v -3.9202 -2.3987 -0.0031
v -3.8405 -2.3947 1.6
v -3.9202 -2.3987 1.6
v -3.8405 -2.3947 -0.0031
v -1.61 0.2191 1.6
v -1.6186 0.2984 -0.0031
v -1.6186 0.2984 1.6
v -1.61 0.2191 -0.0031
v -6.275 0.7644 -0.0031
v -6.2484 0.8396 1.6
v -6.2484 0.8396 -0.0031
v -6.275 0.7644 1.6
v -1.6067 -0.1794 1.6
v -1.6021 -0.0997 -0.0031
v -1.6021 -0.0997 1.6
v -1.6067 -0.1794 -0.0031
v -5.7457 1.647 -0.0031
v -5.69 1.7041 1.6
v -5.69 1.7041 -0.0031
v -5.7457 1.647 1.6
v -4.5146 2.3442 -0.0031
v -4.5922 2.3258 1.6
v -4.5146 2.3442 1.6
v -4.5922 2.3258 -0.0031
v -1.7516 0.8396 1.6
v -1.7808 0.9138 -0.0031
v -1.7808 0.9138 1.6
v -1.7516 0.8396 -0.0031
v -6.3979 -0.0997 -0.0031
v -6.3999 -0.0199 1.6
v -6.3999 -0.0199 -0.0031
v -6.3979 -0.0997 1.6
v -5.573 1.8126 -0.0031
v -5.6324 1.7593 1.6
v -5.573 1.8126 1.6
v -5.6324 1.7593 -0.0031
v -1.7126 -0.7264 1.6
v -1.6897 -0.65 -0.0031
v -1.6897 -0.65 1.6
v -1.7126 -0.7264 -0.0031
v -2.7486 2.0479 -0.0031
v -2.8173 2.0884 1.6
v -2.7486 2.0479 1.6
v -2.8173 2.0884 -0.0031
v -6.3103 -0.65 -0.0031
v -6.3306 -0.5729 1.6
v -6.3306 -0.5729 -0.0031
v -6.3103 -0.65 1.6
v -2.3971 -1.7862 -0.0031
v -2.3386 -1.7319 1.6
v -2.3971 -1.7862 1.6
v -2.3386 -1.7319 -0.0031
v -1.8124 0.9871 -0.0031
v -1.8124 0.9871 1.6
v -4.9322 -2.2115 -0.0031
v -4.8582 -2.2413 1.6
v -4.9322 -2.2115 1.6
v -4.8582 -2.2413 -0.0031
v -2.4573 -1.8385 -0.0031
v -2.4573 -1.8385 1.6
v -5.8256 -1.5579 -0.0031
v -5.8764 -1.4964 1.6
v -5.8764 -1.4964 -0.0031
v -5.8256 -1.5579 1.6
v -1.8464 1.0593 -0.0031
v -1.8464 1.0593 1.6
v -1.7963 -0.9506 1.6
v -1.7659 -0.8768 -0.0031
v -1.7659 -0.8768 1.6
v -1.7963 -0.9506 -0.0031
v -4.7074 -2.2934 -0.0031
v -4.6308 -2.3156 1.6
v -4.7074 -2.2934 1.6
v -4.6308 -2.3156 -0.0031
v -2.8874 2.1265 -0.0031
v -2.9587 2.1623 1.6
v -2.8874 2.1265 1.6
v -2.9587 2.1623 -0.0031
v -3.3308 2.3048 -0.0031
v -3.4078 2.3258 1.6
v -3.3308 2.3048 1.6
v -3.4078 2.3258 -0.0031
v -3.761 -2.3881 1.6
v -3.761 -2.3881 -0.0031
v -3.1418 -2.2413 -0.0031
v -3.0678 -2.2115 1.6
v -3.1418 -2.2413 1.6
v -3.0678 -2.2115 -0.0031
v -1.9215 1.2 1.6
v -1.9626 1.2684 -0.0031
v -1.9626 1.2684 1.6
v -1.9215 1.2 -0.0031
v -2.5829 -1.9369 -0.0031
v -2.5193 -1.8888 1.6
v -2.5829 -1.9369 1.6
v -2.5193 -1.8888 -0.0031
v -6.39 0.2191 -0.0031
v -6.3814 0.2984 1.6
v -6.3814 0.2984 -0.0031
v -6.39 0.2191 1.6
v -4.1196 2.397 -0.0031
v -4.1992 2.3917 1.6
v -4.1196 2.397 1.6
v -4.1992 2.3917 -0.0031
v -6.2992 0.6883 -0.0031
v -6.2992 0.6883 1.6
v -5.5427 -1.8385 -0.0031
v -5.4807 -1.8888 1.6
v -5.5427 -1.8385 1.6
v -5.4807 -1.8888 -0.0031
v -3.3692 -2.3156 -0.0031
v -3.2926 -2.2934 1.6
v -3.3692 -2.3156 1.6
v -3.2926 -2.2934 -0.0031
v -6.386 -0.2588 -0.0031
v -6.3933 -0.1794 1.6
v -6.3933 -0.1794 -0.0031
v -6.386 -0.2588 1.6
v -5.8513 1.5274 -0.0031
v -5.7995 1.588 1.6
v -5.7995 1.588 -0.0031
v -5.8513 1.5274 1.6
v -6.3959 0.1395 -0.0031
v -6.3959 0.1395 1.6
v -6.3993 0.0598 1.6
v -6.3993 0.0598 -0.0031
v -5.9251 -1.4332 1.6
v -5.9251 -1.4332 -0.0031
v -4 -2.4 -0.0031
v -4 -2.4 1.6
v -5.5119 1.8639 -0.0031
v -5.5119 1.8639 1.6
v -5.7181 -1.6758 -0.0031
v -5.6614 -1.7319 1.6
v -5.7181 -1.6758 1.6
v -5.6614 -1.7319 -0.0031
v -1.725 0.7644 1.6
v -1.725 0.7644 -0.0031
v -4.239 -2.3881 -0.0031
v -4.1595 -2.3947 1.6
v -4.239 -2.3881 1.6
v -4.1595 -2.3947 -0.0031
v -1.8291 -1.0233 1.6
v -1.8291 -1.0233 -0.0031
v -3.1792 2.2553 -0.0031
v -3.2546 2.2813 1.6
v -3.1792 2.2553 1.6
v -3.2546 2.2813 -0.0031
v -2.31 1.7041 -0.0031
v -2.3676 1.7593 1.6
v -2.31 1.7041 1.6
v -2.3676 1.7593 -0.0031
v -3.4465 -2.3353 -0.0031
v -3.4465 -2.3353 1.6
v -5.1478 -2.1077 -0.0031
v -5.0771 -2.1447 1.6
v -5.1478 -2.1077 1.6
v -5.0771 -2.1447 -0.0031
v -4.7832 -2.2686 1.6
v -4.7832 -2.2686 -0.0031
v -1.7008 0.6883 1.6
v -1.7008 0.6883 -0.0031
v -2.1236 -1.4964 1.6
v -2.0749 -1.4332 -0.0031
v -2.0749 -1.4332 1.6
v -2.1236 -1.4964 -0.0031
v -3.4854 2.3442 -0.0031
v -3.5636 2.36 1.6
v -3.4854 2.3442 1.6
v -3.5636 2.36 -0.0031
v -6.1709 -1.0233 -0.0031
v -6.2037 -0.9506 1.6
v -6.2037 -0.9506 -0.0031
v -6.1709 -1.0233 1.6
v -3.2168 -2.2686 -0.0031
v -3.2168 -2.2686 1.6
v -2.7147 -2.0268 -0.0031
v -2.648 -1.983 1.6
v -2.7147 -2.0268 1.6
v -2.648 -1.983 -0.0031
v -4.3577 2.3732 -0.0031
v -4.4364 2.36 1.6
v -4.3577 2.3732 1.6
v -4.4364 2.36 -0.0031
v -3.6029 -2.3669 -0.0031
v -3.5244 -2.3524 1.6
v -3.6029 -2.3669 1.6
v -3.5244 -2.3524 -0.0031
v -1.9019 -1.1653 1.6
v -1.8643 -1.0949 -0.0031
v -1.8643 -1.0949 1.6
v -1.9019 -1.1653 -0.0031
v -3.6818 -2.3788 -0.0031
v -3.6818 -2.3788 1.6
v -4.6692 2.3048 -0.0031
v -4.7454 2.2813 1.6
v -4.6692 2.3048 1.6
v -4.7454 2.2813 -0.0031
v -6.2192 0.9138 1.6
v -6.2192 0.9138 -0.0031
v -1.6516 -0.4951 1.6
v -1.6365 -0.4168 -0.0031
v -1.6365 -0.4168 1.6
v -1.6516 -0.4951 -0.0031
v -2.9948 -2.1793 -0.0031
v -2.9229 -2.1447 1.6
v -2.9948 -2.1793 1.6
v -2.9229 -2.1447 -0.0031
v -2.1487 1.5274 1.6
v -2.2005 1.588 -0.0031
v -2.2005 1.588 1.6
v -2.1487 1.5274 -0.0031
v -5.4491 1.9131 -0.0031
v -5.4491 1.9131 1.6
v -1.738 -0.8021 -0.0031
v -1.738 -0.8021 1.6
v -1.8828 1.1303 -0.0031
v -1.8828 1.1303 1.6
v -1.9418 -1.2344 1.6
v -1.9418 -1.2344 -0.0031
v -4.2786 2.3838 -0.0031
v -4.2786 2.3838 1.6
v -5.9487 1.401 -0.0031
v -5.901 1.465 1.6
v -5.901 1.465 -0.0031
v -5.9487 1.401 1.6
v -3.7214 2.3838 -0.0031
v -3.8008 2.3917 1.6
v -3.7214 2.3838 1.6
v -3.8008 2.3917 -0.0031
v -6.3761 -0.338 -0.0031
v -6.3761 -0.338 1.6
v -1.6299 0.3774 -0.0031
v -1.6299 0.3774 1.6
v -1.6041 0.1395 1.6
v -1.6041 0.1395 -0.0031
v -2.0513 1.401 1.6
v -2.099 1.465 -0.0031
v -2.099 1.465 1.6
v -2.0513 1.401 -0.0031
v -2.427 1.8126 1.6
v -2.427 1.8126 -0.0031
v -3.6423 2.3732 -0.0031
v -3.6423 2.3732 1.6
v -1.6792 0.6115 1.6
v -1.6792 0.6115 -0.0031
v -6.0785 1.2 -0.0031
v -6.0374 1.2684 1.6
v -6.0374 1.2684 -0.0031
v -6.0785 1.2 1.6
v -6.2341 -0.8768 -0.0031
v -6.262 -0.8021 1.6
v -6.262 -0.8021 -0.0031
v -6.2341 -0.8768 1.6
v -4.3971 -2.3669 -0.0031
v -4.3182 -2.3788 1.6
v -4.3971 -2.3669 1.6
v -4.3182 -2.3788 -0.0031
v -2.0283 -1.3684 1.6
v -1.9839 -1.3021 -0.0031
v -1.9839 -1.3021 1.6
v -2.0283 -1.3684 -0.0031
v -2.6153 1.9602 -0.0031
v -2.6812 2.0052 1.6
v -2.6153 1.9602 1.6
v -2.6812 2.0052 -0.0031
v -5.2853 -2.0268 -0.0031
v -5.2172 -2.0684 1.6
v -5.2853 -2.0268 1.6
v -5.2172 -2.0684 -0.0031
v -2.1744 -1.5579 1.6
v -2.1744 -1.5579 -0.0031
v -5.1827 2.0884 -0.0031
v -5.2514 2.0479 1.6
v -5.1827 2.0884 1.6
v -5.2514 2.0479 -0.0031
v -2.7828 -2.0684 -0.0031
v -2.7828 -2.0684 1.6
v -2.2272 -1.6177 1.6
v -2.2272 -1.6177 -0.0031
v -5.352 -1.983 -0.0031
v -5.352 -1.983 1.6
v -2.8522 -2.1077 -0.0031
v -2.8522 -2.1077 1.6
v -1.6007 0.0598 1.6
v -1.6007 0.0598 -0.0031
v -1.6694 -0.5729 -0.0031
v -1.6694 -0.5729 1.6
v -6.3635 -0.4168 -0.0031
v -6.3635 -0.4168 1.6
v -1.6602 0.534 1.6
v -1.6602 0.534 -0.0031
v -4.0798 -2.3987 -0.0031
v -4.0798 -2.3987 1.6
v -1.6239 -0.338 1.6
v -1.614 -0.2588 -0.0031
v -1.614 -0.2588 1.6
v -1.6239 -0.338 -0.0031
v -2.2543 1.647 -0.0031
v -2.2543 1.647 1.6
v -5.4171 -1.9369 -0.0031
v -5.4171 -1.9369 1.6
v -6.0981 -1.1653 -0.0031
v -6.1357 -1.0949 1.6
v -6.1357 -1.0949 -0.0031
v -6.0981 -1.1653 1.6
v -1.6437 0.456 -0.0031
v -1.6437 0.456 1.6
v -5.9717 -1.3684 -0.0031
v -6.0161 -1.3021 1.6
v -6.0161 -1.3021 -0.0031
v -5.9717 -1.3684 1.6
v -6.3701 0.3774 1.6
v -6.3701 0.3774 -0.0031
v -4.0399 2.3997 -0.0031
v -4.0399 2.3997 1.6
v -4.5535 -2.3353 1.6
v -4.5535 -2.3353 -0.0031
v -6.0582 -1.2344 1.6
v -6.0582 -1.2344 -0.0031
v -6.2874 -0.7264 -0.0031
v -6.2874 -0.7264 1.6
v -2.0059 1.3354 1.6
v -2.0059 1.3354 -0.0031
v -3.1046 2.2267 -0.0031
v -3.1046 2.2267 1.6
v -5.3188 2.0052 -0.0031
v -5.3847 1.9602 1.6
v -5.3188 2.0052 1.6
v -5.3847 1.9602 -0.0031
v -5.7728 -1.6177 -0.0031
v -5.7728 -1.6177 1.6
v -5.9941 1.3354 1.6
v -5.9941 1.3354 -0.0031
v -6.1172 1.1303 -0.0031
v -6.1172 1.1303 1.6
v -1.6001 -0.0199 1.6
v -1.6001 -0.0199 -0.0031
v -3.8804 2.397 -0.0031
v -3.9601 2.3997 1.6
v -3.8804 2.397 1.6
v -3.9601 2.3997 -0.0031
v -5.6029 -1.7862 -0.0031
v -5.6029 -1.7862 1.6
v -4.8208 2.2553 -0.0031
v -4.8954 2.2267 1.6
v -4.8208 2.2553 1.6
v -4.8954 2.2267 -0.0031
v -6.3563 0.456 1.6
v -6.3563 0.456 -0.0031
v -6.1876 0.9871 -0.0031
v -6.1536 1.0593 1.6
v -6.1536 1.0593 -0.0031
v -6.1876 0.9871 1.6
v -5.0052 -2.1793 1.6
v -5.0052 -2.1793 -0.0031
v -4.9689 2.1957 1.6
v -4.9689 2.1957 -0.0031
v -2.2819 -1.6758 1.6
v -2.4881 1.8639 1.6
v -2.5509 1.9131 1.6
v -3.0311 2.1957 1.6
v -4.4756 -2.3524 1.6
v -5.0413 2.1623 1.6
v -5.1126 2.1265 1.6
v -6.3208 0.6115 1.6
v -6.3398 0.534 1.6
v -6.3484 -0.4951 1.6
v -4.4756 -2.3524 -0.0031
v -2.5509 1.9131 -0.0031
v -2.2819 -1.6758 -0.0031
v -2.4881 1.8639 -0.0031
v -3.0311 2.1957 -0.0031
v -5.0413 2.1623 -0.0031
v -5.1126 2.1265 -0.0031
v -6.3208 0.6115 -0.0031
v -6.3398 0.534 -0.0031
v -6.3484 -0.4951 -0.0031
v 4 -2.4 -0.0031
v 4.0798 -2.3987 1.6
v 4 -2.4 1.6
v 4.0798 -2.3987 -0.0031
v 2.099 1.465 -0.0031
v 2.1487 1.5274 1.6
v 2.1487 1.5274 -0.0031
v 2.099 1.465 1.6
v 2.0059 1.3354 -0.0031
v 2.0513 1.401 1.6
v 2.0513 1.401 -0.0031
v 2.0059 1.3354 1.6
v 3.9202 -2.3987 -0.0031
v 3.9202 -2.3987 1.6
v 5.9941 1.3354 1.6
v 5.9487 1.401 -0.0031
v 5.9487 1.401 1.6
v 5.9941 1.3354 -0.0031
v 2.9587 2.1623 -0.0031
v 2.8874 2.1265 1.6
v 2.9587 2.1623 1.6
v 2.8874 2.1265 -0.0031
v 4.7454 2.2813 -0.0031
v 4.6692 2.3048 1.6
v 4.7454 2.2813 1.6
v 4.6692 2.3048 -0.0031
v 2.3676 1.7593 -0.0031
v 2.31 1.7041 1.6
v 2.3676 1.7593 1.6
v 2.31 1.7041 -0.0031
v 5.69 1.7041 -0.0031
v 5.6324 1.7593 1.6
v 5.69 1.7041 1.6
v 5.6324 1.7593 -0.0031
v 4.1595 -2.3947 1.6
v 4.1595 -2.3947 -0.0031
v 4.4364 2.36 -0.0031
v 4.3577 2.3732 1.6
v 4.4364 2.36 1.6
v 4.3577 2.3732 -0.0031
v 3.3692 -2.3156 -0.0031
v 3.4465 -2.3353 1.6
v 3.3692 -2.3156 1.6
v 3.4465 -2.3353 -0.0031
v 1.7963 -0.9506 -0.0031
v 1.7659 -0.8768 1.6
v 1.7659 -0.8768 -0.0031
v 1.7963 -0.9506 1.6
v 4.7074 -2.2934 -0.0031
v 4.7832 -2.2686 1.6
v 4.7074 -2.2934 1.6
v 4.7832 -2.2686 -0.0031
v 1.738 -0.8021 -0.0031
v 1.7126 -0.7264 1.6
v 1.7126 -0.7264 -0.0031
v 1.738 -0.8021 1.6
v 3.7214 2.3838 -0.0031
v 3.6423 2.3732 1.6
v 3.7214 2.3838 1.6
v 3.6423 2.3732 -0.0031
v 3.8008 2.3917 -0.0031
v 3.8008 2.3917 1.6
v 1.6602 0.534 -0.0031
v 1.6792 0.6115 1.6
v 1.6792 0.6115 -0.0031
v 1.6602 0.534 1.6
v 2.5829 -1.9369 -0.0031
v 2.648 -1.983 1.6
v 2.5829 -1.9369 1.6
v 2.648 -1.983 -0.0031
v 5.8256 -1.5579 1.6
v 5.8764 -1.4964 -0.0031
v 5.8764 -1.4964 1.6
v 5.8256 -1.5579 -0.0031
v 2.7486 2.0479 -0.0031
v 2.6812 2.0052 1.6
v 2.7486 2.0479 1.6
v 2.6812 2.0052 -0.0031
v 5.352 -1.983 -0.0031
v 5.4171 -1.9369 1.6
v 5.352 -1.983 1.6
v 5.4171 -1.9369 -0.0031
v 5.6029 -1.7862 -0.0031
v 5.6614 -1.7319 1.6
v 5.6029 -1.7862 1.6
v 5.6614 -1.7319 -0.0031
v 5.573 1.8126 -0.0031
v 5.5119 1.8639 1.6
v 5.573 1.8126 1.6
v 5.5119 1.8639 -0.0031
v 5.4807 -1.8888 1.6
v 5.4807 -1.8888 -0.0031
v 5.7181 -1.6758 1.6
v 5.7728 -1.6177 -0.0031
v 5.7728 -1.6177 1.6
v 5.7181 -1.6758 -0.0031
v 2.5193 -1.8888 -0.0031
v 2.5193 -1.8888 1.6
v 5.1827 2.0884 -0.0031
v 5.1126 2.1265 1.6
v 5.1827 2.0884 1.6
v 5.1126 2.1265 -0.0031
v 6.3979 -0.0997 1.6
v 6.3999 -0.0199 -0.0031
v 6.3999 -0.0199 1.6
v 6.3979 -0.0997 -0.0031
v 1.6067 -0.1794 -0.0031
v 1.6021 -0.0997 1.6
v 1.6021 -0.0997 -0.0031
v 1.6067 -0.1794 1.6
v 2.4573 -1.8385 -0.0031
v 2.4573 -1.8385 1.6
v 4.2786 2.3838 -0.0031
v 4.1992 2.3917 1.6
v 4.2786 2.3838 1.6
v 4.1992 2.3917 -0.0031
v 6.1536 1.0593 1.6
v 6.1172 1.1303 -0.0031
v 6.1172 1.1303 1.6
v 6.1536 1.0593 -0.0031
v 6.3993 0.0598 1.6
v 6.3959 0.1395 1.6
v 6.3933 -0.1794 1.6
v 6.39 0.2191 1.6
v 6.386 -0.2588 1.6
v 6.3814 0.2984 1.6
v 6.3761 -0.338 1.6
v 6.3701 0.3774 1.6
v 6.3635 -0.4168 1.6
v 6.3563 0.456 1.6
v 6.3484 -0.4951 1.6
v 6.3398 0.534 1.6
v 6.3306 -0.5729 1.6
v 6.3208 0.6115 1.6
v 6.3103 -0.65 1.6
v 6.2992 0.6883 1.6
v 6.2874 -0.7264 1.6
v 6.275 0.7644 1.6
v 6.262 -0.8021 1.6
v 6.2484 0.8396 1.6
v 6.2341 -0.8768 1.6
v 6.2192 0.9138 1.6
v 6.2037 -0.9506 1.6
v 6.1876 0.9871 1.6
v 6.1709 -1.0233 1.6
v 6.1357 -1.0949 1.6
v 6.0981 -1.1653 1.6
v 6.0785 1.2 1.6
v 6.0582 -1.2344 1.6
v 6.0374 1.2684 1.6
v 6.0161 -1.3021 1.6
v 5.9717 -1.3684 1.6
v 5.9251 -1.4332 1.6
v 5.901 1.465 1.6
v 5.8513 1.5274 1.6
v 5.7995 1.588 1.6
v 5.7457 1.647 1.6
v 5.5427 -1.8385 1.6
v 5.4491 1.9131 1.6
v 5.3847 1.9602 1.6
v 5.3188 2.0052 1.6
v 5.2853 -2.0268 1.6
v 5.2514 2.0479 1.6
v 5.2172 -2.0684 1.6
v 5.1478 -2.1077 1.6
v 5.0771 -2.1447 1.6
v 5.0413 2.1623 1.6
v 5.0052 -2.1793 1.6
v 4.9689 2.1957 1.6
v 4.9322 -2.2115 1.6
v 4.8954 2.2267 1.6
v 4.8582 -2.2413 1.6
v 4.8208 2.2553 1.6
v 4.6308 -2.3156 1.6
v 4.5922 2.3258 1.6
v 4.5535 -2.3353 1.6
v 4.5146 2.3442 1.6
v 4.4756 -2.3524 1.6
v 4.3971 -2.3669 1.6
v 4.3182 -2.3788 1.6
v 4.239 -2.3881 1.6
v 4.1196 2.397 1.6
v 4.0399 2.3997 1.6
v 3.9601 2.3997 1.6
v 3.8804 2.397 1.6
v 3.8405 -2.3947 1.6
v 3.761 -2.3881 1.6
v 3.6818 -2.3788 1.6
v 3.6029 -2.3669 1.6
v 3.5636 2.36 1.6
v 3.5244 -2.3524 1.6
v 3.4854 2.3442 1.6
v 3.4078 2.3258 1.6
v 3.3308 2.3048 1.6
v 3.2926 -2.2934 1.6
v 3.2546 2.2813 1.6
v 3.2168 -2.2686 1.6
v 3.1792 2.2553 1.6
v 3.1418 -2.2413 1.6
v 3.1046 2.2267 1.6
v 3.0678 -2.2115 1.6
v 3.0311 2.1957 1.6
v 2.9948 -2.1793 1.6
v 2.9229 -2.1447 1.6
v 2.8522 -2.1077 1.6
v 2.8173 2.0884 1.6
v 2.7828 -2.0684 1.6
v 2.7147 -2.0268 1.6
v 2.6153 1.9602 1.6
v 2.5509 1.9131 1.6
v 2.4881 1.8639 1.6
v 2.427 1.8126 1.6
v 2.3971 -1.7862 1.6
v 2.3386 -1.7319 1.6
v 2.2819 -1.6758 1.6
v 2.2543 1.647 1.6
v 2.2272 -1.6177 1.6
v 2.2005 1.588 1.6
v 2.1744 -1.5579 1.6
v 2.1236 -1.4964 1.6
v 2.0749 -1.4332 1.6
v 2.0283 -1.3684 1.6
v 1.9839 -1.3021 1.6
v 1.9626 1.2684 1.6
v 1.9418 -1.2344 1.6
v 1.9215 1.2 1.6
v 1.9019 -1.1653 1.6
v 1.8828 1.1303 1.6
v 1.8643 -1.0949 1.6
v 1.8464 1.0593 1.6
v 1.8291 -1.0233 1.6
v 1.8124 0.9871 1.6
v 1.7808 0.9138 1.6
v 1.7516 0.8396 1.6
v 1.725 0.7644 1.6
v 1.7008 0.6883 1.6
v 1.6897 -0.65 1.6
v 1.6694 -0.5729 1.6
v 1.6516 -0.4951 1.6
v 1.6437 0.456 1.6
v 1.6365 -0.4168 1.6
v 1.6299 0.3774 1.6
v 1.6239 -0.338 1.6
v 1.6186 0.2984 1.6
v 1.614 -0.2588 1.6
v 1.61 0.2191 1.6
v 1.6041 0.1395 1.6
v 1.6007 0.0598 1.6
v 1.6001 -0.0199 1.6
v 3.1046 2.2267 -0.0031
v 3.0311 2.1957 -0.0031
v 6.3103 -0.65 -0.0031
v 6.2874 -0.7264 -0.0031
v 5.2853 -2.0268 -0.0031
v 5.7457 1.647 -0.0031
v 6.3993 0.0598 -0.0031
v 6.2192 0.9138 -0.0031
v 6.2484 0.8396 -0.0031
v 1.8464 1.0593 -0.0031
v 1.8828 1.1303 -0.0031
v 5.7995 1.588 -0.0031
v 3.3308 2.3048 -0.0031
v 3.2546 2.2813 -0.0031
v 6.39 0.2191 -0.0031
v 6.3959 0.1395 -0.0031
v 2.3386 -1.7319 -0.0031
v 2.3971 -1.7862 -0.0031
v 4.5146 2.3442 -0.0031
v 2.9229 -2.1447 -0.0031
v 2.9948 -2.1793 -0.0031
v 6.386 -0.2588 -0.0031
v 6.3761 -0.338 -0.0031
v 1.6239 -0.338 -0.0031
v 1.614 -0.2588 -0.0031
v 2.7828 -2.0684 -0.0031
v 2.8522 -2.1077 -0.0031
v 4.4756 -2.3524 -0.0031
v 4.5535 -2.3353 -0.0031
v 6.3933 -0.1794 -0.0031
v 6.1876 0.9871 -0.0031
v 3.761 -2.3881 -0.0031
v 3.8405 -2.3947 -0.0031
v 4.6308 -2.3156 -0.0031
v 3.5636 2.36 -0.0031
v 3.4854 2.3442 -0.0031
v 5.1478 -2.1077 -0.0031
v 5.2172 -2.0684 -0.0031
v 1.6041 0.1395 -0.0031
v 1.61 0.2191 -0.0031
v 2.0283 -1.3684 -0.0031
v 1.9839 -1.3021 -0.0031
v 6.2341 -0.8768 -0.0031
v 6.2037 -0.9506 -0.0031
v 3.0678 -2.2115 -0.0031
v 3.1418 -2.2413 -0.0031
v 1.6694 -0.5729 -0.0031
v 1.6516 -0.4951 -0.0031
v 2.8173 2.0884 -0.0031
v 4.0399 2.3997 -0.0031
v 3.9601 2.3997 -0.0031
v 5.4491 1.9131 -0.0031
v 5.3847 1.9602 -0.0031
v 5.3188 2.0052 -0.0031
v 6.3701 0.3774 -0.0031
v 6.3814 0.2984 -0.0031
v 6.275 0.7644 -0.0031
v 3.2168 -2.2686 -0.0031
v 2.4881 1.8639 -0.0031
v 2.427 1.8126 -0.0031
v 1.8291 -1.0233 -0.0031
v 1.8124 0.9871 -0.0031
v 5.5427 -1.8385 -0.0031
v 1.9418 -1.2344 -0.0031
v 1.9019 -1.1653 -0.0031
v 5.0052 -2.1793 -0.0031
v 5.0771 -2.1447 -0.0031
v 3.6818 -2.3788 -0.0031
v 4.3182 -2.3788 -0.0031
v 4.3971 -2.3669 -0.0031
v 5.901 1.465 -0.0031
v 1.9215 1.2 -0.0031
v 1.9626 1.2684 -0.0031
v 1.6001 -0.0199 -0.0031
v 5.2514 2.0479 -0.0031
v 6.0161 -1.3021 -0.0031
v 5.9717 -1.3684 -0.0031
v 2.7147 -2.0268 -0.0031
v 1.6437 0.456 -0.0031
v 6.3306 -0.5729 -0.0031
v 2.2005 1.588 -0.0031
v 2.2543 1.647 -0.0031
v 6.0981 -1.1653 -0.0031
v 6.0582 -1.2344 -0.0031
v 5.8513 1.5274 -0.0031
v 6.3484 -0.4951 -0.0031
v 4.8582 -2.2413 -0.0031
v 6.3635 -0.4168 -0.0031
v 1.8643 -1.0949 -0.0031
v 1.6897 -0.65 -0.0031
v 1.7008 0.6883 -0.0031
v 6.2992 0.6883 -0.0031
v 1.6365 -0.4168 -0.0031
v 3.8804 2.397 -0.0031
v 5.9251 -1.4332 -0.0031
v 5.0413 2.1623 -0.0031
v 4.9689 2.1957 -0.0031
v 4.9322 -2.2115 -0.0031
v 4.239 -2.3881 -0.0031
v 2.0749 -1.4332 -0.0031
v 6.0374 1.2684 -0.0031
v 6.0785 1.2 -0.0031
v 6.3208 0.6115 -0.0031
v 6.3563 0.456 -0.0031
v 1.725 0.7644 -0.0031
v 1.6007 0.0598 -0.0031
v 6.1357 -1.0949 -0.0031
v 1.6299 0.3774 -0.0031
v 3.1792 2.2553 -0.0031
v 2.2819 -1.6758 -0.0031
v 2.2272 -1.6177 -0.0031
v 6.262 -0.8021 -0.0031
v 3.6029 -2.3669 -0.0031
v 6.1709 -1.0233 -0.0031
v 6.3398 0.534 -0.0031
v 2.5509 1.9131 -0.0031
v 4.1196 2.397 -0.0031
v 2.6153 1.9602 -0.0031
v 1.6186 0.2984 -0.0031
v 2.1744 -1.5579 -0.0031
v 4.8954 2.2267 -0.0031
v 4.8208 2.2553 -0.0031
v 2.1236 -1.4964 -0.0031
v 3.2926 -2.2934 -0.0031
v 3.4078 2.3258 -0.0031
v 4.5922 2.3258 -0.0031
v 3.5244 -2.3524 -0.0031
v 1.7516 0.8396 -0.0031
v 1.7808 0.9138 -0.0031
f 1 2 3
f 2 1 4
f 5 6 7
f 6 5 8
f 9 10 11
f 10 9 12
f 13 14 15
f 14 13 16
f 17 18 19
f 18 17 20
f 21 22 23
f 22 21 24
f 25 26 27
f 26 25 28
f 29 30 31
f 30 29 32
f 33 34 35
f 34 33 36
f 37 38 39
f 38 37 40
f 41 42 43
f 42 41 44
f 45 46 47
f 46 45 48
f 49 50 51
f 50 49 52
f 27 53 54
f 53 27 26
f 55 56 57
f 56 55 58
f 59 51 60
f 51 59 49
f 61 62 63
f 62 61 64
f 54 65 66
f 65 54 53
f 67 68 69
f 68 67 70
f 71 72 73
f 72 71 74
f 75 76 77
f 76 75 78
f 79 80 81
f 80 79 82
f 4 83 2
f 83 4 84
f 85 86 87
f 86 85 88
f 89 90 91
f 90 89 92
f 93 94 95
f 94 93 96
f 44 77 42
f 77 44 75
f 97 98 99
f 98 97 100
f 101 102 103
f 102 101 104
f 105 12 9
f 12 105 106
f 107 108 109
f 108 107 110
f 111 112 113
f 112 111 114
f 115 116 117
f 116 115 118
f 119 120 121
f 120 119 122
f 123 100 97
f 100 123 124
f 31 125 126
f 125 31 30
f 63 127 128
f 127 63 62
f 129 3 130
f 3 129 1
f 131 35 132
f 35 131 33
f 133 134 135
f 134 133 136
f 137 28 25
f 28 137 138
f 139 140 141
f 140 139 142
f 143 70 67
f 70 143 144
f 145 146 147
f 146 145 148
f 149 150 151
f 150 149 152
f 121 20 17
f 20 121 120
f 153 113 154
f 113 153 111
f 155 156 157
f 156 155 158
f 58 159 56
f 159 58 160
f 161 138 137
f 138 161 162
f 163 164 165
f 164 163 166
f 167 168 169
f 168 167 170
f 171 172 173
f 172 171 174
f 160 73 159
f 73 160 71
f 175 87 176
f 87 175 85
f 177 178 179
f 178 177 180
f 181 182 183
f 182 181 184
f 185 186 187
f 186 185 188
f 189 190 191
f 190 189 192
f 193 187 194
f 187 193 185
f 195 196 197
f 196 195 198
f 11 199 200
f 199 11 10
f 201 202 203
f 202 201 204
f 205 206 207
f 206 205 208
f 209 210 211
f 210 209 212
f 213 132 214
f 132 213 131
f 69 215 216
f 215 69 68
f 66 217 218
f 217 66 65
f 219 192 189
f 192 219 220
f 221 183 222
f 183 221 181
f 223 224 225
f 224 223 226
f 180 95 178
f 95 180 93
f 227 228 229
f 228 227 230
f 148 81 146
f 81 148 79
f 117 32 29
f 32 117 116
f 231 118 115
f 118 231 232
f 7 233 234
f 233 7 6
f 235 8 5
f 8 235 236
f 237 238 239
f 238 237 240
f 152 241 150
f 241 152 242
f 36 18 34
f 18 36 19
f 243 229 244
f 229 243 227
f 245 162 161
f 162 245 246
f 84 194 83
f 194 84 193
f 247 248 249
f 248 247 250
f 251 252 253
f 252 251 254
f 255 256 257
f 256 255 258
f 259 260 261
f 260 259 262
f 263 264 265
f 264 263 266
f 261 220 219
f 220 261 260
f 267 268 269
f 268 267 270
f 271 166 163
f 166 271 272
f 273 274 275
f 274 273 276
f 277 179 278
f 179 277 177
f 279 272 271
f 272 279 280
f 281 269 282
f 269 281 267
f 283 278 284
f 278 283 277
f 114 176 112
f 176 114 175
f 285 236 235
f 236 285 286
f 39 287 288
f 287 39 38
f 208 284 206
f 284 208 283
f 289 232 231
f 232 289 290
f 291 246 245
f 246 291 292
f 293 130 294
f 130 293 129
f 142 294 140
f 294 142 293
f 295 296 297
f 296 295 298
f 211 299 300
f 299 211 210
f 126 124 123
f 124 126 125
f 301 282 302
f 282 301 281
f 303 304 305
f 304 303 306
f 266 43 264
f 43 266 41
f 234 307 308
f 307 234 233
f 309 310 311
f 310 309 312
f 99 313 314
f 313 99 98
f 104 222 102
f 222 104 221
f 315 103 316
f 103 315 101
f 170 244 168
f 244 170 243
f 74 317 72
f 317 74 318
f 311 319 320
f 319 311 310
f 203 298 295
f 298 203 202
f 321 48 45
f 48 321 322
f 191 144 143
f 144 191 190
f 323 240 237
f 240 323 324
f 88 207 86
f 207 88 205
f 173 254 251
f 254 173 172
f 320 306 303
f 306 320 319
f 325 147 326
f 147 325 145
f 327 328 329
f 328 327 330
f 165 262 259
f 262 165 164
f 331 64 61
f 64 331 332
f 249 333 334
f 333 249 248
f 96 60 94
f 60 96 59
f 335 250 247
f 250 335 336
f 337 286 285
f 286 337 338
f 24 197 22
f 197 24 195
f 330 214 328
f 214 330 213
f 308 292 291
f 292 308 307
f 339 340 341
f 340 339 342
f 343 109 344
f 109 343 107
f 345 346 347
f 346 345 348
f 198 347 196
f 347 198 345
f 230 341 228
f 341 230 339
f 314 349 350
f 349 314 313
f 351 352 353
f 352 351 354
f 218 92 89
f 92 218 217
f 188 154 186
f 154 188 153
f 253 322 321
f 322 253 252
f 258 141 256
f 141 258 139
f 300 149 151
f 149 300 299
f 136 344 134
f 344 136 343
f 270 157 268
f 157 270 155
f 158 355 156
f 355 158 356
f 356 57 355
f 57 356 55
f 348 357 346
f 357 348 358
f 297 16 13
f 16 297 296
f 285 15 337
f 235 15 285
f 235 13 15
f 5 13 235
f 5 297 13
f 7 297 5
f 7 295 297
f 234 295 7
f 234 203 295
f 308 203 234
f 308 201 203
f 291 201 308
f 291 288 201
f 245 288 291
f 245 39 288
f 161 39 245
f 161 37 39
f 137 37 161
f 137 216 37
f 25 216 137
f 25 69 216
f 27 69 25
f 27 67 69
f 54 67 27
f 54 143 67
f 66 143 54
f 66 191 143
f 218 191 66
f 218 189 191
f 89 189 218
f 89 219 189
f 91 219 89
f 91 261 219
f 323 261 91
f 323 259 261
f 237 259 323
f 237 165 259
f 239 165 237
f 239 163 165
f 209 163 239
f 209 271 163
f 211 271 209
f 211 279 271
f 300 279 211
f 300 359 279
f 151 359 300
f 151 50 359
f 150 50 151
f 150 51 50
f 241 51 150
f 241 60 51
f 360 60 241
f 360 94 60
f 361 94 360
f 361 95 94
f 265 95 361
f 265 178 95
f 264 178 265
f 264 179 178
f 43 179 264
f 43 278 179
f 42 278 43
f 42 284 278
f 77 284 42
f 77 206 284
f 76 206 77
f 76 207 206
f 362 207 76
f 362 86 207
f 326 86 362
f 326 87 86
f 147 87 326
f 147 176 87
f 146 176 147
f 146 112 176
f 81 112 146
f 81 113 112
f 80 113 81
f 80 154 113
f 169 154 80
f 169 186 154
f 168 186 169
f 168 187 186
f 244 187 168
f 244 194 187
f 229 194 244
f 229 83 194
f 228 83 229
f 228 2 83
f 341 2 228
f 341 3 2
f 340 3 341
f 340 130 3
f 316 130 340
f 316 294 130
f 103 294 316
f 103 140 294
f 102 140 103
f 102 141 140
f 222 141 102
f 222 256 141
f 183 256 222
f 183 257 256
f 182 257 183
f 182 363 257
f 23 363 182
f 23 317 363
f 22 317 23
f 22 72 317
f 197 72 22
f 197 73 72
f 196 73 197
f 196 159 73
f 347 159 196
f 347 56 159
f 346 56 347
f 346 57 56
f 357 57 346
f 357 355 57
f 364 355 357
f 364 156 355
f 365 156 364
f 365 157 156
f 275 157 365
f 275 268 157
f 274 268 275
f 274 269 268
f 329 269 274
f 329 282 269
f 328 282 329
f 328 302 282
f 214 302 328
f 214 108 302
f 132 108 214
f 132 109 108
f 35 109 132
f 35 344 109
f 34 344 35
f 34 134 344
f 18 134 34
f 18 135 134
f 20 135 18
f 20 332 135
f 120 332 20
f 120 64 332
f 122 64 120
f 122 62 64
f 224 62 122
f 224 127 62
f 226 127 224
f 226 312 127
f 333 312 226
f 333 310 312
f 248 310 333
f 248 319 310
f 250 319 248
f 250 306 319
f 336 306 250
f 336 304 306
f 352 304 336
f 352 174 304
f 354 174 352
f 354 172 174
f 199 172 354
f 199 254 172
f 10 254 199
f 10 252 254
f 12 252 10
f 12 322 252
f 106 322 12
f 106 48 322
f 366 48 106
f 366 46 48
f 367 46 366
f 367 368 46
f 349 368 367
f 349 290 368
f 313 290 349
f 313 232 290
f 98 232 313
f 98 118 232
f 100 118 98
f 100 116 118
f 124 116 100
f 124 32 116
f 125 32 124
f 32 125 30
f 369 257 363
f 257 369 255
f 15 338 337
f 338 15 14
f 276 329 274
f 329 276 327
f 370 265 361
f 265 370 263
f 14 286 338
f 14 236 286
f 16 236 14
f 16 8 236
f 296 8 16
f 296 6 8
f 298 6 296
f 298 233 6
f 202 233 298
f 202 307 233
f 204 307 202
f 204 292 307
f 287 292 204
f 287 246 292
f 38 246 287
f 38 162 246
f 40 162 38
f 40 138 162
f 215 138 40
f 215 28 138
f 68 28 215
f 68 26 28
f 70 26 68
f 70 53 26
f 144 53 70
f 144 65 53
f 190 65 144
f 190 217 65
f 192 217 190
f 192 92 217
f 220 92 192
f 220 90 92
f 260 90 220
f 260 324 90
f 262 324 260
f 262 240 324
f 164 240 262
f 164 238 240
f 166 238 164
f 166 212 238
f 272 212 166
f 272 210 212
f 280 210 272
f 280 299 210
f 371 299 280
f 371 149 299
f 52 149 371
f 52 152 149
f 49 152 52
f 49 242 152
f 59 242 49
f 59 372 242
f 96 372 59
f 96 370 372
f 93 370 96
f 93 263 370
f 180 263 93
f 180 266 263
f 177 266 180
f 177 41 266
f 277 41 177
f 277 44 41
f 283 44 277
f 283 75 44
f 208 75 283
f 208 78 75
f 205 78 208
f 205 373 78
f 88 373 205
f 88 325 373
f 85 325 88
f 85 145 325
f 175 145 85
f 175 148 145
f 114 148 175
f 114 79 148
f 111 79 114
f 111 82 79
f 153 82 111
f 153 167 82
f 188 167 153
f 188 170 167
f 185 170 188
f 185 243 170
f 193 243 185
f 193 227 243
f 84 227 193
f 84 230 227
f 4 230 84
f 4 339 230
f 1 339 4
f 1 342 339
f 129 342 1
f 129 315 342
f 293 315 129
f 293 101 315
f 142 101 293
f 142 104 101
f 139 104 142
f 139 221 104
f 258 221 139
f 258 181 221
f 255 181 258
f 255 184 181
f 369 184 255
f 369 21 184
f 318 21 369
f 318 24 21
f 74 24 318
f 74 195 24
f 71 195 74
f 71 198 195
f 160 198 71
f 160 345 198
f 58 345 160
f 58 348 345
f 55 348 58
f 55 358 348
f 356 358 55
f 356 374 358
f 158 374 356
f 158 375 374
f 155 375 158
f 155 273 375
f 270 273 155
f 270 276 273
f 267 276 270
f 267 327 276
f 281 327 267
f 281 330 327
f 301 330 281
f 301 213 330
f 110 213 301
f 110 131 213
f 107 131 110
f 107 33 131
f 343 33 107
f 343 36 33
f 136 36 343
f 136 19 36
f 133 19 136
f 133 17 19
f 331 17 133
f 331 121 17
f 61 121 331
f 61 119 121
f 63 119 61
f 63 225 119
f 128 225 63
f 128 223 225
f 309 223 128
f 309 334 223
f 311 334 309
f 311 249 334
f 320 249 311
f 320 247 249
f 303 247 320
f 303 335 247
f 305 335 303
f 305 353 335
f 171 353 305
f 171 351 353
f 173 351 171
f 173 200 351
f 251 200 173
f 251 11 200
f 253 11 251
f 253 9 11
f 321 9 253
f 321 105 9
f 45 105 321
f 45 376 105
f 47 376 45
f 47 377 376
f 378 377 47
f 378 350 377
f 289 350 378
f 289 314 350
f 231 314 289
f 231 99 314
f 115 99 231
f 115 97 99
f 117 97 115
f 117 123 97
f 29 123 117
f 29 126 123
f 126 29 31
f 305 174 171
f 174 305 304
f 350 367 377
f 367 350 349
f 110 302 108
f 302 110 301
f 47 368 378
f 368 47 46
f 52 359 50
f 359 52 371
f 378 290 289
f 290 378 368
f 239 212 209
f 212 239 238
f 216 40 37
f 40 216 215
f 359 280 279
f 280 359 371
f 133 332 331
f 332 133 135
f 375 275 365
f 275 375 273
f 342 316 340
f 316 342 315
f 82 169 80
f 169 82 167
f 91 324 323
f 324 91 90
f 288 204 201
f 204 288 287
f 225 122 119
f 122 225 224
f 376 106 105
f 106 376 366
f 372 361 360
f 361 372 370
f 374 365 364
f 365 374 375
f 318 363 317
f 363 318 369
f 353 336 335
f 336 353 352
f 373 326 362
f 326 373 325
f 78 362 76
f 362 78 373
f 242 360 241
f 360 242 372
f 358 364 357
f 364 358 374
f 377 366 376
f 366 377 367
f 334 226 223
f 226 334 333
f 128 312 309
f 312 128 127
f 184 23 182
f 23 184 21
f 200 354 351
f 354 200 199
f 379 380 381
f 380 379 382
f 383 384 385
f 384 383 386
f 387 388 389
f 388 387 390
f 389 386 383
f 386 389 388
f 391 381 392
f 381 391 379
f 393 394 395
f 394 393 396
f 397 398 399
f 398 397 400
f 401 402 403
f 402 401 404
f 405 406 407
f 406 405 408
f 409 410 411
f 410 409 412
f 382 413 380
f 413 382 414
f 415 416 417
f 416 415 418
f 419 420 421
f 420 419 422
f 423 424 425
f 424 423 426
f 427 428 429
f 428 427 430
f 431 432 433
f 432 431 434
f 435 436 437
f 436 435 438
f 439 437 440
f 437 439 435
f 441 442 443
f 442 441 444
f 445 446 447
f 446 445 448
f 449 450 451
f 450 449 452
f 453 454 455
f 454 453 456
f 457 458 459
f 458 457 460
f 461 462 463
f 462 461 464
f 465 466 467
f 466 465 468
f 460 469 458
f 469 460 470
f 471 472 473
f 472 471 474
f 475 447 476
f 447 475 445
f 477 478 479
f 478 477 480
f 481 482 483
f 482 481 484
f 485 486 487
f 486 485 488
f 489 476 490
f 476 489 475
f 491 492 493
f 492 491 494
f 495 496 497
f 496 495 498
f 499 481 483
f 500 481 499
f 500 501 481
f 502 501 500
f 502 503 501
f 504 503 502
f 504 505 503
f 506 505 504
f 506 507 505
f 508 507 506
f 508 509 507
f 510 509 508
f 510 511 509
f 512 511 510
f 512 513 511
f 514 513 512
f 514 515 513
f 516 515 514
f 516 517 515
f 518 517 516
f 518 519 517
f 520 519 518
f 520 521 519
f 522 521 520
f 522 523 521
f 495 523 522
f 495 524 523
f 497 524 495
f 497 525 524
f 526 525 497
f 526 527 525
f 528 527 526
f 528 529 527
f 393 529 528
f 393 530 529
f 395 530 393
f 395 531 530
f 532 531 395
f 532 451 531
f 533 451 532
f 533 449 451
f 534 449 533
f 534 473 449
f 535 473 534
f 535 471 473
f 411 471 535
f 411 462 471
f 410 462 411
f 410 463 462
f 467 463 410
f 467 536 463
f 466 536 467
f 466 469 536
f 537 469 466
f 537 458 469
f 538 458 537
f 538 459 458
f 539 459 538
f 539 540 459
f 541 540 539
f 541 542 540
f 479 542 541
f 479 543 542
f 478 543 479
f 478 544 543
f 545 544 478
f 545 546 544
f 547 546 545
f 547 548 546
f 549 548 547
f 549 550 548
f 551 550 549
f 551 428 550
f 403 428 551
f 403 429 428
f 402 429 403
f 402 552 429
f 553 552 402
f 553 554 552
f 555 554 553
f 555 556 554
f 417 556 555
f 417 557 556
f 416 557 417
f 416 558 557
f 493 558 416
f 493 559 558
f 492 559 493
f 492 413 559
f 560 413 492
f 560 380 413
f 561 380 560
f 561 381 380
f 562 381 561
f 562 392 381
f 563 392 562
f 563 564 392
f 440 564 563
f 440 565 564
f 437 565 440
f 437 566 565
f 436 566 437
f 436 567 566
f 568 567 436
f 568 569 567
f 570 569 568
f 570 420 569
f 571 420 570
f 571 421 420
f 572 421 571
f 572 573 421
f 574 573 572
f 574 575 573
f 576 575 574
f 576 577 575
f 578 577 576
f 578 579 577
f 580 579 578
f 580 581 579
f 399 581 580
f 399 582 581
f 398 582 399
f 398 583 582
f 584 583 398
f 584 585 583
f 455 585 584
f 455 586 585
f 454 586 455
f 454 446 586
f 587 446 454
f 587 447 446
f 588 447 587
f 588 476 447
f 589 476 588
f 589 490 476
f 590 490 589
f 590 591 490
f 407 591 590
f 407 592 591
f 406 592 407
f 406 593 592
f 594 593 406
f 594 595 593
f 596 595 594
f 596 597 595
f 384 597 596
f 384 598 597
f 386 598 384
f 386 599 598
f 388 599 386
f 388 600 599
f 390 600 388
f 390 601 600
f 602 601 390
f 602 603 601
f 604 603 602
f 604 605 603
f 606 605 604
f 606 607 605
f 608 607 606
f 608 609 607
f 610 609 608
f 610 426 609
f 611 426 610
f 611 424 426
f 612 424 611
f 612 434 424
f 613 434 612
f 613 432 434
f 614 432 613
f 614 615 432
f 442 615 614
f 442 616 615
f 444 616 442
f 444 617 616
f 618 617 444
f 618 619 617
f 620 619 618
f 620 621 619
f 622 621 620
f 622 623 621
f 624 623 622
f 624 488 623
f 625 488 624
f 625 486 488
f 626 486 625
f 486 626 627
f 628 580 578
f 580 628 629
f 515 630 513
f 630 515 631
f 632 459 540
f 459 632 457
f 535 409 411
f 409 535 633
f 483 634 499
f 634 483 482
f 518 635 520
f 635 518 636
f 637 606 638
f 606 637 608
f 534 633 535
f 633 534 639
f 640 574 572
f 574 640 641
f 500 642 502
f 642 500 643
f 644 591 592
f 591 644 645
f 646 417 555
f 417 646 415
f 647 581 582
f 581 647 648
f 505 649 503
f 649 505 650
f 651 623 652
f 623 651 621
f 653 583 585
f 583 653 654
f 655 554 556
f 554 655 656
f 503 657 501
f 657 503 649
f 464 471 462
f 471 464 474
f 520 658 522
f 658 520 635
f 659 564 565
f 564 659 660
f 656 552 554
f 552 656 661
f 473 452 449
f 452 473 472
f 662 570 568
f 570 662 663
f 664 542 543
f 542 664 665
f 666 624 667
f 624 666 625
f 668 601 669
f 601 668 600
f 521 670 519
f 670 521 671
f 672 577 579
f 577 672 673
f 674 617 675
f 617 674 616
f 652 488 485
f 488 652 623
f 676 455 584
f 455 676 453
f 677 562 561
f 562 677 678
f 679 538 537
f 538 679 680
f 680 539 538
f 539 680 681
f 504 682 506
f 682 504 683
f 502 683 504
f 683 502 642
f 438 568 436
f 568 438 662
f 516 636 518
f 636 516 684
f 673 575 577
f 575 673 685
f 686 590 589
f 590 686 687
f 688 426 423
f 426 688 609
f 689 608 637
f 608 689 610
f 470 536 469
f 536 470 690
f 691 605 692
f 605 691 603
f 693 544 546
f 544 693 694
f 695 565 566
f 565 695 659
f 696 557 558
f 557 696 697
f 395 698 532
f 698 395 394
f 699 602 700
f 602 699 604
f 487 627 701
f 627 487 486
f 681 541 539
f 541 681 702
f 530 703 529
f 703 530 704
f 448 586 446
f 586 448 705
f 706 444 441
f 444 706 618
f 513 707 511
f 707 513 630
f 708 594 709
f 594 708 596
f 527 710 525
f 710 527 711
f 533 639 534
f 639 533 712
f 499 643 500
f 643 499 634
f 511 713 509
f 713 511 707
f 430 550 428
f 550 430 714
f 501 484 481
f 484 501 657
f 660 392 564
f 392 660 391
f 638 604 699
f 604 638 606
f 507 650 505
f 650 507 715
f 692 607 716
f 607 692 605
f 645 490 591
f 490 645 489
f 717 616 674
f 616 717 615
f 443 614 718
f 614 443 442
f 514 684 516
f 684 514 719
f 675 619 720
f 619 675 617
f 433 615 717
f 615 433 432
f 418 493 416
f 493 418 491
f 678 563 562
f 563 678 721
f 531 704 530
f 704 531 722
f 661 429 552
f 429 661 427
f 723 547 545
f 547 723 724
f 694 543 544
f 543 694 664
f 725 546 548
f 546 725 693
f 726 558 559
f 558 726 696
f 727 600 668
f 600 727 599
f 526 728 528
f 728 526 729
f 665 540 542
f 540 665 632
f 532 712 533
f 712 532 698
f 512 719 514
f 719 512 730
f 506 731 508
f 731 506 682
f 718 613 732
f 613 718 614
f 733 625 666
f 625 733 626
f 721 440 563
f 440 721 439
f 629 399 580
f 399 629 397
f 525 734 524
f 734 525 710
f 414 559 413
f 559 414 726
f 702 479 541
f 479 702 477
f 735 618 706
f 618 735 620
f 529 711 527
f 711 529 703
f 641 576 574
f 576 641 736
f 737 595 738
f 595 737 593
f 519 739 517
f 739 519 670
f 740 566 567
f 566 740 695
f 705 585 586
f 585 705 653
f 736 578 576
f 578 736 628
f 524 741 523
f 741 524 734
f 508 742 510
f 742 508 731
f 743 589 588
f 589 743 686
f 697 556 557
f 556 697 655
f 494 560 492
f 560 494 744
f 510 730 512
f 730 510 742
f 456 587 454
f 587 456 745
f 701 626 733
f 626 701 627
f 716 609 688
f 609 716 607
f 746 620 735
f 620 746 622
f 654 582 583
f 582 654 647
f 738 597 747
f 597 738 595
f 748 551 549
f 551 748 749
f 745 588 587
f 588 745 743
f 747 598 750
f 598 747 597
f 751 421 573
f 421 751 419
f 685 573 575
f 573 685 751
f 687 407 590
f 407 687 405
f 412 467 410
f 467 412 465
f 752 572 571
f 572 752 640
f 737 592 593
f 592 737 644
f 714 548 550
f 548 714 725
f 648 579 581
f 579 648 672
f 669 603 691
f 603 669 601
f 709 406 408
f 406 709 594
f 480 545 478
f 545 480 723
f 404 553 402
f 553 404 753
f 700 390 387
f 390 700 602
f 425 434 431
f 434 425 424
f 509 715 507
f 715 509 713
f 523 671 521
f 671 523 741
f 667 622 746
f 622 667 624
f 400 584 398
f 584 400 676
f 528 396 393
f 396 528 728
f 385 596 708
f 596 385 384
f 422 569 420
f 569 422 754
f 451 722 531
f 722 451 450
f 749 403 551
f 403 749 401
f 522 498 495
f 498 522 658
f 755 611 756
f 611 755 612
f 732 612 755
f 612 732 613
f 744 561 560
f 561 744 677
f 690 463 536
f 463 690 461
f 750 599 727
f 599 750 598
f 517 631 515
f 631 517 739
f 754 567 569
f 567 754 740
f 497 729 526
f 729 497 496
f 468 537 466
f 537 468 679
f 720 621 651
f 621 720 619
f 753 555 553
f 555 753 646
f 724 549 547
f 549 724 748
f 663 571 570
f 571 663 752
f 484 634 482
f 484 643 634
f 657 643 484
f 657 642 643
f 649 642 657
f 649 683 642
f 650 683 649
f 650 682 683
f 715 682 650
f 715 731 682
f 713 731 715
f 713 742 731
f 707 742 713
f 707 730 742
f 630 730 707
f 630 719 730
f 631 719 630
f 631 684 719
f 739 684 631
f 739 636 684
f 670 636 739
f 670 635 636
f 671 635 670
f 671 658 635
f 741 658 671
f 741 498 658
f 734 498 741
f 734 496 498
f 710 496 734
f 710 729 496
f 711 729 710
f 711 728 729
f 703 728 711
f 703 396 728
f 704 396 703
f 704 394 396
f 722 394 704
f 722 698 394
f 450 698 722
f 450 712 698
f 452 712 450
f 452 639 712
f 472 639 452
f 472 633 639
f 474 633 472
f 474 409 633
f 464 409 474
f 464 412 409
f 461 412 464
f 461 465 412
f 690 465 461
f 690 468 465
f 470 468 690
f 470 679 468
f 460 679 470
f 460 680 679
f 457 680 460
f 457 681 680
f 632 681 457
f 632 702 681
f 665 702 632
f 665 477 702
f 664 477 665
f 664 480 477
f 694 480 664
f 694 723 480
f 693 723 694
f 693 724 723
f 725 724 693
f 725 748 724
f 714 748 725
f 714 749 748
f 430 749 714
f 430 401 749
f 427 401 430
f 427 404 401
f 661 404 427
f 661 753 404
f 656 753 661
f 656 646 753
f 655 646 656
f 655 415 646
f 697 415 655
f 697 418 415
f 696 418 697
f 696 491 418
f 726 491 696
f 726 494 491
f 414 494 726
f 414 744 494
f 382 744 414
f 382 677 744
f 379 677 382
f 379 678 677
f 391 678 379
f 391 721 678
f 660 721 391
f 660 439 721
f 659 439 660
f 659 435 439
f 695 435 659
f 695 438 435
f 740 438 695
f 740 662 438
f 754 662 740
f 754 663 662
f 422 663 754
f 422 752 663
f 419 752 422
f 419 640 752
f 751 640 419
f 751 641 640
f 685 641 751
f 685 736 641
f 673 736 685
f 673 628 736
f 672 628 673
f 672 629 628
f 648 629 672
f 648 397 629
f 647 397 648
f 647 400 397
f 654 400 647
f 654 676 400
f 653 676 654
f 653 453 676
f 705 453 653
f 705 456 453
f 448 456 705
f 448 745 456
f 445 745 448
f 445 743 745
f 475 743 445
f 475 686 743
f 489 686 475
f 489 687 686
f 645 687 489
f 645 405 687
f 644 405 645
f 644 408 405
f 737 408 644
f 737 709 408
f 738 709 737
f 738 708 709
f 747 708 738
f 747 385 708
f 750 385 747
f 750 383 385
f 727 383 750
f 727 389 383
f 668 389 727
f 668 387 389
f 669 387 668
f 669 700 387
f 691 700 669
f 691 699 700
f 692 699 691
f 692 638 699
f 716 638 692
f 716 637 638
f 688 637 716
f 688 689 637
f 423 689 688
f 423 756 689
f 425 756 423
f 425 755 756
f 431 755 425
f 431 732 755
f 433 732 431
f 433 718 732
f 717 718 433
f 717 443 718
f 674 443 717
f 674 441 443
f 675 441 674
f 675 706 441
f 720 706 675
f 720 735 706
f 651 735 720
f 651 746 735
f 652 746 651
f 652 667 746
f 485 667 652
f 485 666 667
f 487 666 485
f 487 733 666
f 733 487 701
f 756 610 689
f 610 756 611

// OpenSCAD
use <../lib.scad>
use <s/3039s01.scad>
$fa=1; $fs=0.2;
function ldraw_lib__3039p71(realsolid=false) = [
// 0 Slope Brick 45  2 x  2 with Red "1" in Yellow Outline Pattern
// 0 Name: 3039p71.dat
// 0 Author: Magnus Forsberg [MagFors]
// 0 !LDRAW_ORG Part UPDATE 2013-02
// 0 !LICENSE Licensed under CC BY 2.0 and CC BY 4.0 : see CAreadme.txt
// 
// 0 BFC CERTIFY CCW
  [0,"BFC","CERTIFY"],
  [0,"BFC","CCW"],
// 
// 0 !HISTORY 2013-12-23 [PTadmin] Official Update 2013-02
// 
// 
// 1 16 0 0 0 1 0 0 0 1 0 0 0 1 s\3039s01.dat
  [1,16,0,0,0,1,0,0,0,1,0,0,0,1, ldraw_lib__s__3039s01(realsolid)],
// 3 4 -0.672 3.255 -13.255 -1.195 3.703 -13.703 -0.859 6.582 -16.582
  [3,4,-0.672,3.255,-13.255,-1.195,3.703,-13.703,-0.859,6.582,-16.582],
// 3 4 -1.195 3.703 -13.703 -1.872 4.072 -14.072 -0.859 6.582 -16.582
  [3,4,-1.195,3.703,-13.703,-1.872,4.072,-14.072,-0.859,6.582,-16.582],
// 3 4 -1.872 4.072 -14.072 -2.705 4.3 -14.3 -0.859 6.582 -16.582
  [3,4,-1.872,4.072,-14.072,-2.705,4.3,-14.3,-0.859,6.582,-16.582],
// 4 4 -0.859 6.582 -16.582 -0.795 18.181 -28.181 2.771 18.181 -28.181 2.771 1.794 -11.794
  [4,4,-0.859,6.582,-16.582,-0.795,18.181,-28.181,2.771,18.181,-28.181,2.771,1.794,-11.794],
// 3 4 2.771 1.794 -11.794 -0.106 2.305 -12.305 -0.261 2.689 -12.689
  [3,4,2.771,1.794,-11.794,-0.106,2.305,-12.305,-0.261,2.689,-12.689],
// 4 4 -0.261 2.689 -12.689 -0.672 3.255 -13.255 -0.859 6.582 -16.582 2.771 1.794 -11.794
  [4,4,-0.261,2.689,-12.689,-0.672,3.255,-13.255,-0.859,6.582,-16.582,2.771,1.794,-11.794],
// 4 4 -4.825 4.632 -14.632 -5.723 4.632 -14.632 -5.723 6.549 -16.549 -0.859 6.582 -16.582
  [4,4,-4.825,4.632,-14.632,-5.723,4.632,-14.632,-5.723,6.549,-16.549,-0.859,6.582,-16.582],
// 3 4 -0.006 1.794 -11.794 -0.106 2.305 -12.305 2.771 1.794 -11.794
  [3,4,-0.006,1.794,-11.794,-0.106,2.305,-12.305,2.771,1.794,-11.794],
// 3 4 -2.705 4.3 -14.3 -3.705 4.528 -14.528 -0.859 6.582 -16.582
  [3,4,-2.705,4.3,-14.3,-3.705,4.528,-14.528,-0.859,6.582,-16.582],
// 3 4 -3.705 4.528 -14.528 -4.825 4.632 -14.632 -0.859 6.582 -16.582
  [3,4,-3.705,4.528,-14.528,-4.825,4.632,-14.632,-0.859,6.582,-16.582],
// 3 14 -5.723 4.632 -14.632 -6.9 7.283 -17.283 -5.723 6.549 -16.549
  [3,14,-5.723,4.632,-14.632,-6.9,7.283,-17.283,-5.723,6.549,-16.549],
// 4 14 -5.723 6.549 -16.549 -6.9 7.283 -17.283 -1.9 7.354 -17.354 -0.859 6.582 -16.582
  [4,14,-5.723,6.549,-16.549,-6.9,7.283,-17.283,-1.9,7.354,-17.354,-0.859,6.582,-16.582],
// 4 14 -4.825 4.632 -14.632 -3.9 3.606 -13.606 -5 3.748 -13.748 -5.723 4.632 -14.632
  [4,14,-4.825,4.632,-14.632,-3.9,3.606,-13.606,-5,3.748,-13.748,-5.723,4.632,-14.632],
// 3 14 -5 3.748 -13.748 -6 3.818 -13.818 -5.723 4.632 -14.632
  [3,14,-5,3.748,-13.748,-6,3.818,-13.818,-5.723,4.632,-14.632],
// 4 14 -1.9 7.354 -17.354 -1.9 19.092 -29.092 -0.795 18.181 -28.181 -0.859 6.582 -16.582
  [4,14,-1.9,7.354,-17.354,-1.9,19.092,-29.092,-0.795,18.181,-28.181,-0.859,6.582,-16.582],
// 4 14 -0.795 18.181 -28.181 -1.9 19.092 -29.092 3.8 19.092 -29.092 2.771 18.181 -28.181
  [4,14,-0.795,18.181,-28.181,-1.9,19.092,-29.092,3.8,19.092,-29.092,2.771,18.181,-28.181],
// 3 14 -1.2 1.202 -11.202 -0.006 1.794 -11.794 2.771 1.794 -11.794
  [3,14,-1.2,1.202,-11.202,-0.006,1.794,-11.794,2.771,1.794,-11.794],
// 4 14 2.771 1.794 -11.794 2.771 18.181 -28.181 3.8 19.092 -29.092 3.8 0.919 -10.919
  [4,14,2.771,1.794,-11.794,2.771,18.181,-28.181,3.8,19.092,-29.092,3.8,0.919,-10.919],
// 4 14 -3.705 4.528 -14.528 -3 3.394 -13.394 -3.9 3.606 -13.606 -4.825 4.632 -14.632
  [4,14,-3.705,4.528,-14.528,-3,3.394,-13.394,-3.9,3.606,-13.606,-4.825,4.632,-14.632],
// 4 14 -0.006 1.794 -11.794 -1.2 1.202 -11.202 -1.3 1.768 -11.768 -0.106 2.305 -12.305
  [4,14,-0.006,1.794,-11.794,-1.2,1.202,-11.202,-1.3,1.768,-11.768,-0.106,2.305,-12.305],
// 4 14 -0.106 2.305 -12.305 -1.3 1.768 -11.768 -1.5 2.404 -12.404 -0.261 2.689 -12.689
  [4,14,-0.106,2.305,-12.305,-1.3,1.768,-11.768,-1.5,2.404,-12.404,-0.261,2.689,-12.689],
// 4 14 3.8 0.919 -10.919 -1.2 0.919 -10.919 -1.2 1.202 -11.202 2.771 1.794 -11.794
  [4,14,3.8,0.919,-10.919,-1.2,0.919,-10.919,-1.2,1.202,-11.202,2.771,1.794,-11.794],
// 4 14 -6 3.818 -13.818 -6.9 3.818 -13.818 -6.9 7.283 -17.283 -5.723 4.632 -14.632
  [4,14,-6,3.818,-13.818,-6.9,3.818,-13.818,-6.9,7.283,-17.283,-5.723,4.632,-14.632],
// 4 14 -1.872 4.072 -14.072 -1.195 3.703 -13.703 -2.4 3.111 -13.111 -3 3.394 -13.394
  [4,14,-1.872,4.072,-14.072,-1.195,3.703,-13.703,-2.4,3.111,-13.111,-3,3.394,-13.394],
// 4 14 -2.705 4.3 -14.3 -1.872 4.072 -14.072 -3 3.394 -13.394 -3.705 4.528 -14.528
  [4,14,-2.705,4.3,-14.3,-1.872,4.072,-14.072,-3,3.394,-13.394,-3.705,4.528,-14.528],
// 4 14 -0.261 2.689 -12.689 -1.5 2.404 -12.404 -1.9 2.828 -12.828 -0.672 3.255 -13.255
  [4,14,-0.261,2.689,-12.689,-1.5,2.404,-12.404,-1.9,2.828,-12.828,-0.672,3.255,-13.255],
// 4 14 -1.9 2.828 -12.828 -2.4 3.111 -13.111 -1.195 3.703 -13.703 -0.672 3.255 -13.255
  [4,14,-1.9,2.828,-12.828,-2.4,3.111,-13.111,-1.195,3.703,-13.703,-0.672,3.255,-13.255],
// 4 16 -6.9 7.283 -17.283 -20 20 -30 -1.9 19.092 -29.092 -1.9 7.354 -17.354
  [4,16,-6.9,7.283,-17.283,-20,20,-30,-1.9,19.092,-29.092,-1.9,7.354,-17.354],
// 4 16 -6.9 7.283 -17.283 -6.9 3.818 -13.818 -20 0 -10 -20 20 -30
  [4,16,-6.9,7.283,-17.283,-6.9,3.818,-13.818,-20,0,-10,-20,20,-30],
// 4 16 -1.9 19.092 -29.092 -20 20 -30 20 20 -30 3.8 19.092 -29.092
  [4,16,-1.9,19.092,-29.092,-20,20,-30,20,20,-30,3.8,19.092,-29.092],
// 4 16 -20 0 -10 -1.2 0.919 -10.919 3.8 0.919 -10.919 20 0 -10
  [4,16,-20,0,-10,-1.2,0.919,-10.919,3.8,0.919,-10.919,20,0,-10],
// 4 16 3.8 0.919 -10.919 3.8 19.092 -29.092 20 20 -30 20 0 -10
  [4,16,3.8,0.919,-10.919,3.8,19.092,-29.092,20,20,-30,20,0,-10],
// 4 16 -20 0 -10 -5 3.748 -13.748 -3.9 3.606 -13.606 -3 3.394 -13.394
  [4,16,-20,0,-10,-5,3.748,-13.748,-3.9,3.606,-13.606,-3,3.394,-13.394],
// 4 16 -20 0 -10 -6.9 3.818 -13.818 -6 3.818 -13.818 -5 3.748 -13.748
  [4,16,-20,0,-10,-6.9,3.818,-13.818,-6,3.818,-13.818,-5,3.748,-13.748],
// 4 16 -20 0 -10 -3 3.394 -13.394 -2.4 3.111 -13.111 -1.9 2.828 -12.828
  [4,16,-20,0,-10,-3,3.394,-13.394,-2.4,3.111,-13.111,-1.9,2.828,-12.828],
// 4 16 -20 0 -10 -1.3 1.768 -11.768 -1.2 1.202 -11.202 -1.2 0.919 -10.919
  [4,16,-20,0,-10,-1.3,1.768,-11.768,-1.2,1.202,-11.202,-1.2,0.919,-10.919],
// 4 16 -20 0 -10 -1.9 2.828 -12.828 -1.5 2.404 -12.404 -1.3 1.768 -11.768
  [4,16,-20,0,-10,-1.9,2.828,-12.828,-1.5,2.404,-12.404,-1.3,1.768,-11.768],
];
module ldraw_lib__3039p71(step=0, col=false, unit=2/5, alt=false, line=0.2, solid=!$preview)
    makepoly(ldraw_lib__3039p71(solid), step=step, col=col, unit=unit, alt=alt, line=line, solid=solid);
ldraw_lib__3039p71(line=0.2);
